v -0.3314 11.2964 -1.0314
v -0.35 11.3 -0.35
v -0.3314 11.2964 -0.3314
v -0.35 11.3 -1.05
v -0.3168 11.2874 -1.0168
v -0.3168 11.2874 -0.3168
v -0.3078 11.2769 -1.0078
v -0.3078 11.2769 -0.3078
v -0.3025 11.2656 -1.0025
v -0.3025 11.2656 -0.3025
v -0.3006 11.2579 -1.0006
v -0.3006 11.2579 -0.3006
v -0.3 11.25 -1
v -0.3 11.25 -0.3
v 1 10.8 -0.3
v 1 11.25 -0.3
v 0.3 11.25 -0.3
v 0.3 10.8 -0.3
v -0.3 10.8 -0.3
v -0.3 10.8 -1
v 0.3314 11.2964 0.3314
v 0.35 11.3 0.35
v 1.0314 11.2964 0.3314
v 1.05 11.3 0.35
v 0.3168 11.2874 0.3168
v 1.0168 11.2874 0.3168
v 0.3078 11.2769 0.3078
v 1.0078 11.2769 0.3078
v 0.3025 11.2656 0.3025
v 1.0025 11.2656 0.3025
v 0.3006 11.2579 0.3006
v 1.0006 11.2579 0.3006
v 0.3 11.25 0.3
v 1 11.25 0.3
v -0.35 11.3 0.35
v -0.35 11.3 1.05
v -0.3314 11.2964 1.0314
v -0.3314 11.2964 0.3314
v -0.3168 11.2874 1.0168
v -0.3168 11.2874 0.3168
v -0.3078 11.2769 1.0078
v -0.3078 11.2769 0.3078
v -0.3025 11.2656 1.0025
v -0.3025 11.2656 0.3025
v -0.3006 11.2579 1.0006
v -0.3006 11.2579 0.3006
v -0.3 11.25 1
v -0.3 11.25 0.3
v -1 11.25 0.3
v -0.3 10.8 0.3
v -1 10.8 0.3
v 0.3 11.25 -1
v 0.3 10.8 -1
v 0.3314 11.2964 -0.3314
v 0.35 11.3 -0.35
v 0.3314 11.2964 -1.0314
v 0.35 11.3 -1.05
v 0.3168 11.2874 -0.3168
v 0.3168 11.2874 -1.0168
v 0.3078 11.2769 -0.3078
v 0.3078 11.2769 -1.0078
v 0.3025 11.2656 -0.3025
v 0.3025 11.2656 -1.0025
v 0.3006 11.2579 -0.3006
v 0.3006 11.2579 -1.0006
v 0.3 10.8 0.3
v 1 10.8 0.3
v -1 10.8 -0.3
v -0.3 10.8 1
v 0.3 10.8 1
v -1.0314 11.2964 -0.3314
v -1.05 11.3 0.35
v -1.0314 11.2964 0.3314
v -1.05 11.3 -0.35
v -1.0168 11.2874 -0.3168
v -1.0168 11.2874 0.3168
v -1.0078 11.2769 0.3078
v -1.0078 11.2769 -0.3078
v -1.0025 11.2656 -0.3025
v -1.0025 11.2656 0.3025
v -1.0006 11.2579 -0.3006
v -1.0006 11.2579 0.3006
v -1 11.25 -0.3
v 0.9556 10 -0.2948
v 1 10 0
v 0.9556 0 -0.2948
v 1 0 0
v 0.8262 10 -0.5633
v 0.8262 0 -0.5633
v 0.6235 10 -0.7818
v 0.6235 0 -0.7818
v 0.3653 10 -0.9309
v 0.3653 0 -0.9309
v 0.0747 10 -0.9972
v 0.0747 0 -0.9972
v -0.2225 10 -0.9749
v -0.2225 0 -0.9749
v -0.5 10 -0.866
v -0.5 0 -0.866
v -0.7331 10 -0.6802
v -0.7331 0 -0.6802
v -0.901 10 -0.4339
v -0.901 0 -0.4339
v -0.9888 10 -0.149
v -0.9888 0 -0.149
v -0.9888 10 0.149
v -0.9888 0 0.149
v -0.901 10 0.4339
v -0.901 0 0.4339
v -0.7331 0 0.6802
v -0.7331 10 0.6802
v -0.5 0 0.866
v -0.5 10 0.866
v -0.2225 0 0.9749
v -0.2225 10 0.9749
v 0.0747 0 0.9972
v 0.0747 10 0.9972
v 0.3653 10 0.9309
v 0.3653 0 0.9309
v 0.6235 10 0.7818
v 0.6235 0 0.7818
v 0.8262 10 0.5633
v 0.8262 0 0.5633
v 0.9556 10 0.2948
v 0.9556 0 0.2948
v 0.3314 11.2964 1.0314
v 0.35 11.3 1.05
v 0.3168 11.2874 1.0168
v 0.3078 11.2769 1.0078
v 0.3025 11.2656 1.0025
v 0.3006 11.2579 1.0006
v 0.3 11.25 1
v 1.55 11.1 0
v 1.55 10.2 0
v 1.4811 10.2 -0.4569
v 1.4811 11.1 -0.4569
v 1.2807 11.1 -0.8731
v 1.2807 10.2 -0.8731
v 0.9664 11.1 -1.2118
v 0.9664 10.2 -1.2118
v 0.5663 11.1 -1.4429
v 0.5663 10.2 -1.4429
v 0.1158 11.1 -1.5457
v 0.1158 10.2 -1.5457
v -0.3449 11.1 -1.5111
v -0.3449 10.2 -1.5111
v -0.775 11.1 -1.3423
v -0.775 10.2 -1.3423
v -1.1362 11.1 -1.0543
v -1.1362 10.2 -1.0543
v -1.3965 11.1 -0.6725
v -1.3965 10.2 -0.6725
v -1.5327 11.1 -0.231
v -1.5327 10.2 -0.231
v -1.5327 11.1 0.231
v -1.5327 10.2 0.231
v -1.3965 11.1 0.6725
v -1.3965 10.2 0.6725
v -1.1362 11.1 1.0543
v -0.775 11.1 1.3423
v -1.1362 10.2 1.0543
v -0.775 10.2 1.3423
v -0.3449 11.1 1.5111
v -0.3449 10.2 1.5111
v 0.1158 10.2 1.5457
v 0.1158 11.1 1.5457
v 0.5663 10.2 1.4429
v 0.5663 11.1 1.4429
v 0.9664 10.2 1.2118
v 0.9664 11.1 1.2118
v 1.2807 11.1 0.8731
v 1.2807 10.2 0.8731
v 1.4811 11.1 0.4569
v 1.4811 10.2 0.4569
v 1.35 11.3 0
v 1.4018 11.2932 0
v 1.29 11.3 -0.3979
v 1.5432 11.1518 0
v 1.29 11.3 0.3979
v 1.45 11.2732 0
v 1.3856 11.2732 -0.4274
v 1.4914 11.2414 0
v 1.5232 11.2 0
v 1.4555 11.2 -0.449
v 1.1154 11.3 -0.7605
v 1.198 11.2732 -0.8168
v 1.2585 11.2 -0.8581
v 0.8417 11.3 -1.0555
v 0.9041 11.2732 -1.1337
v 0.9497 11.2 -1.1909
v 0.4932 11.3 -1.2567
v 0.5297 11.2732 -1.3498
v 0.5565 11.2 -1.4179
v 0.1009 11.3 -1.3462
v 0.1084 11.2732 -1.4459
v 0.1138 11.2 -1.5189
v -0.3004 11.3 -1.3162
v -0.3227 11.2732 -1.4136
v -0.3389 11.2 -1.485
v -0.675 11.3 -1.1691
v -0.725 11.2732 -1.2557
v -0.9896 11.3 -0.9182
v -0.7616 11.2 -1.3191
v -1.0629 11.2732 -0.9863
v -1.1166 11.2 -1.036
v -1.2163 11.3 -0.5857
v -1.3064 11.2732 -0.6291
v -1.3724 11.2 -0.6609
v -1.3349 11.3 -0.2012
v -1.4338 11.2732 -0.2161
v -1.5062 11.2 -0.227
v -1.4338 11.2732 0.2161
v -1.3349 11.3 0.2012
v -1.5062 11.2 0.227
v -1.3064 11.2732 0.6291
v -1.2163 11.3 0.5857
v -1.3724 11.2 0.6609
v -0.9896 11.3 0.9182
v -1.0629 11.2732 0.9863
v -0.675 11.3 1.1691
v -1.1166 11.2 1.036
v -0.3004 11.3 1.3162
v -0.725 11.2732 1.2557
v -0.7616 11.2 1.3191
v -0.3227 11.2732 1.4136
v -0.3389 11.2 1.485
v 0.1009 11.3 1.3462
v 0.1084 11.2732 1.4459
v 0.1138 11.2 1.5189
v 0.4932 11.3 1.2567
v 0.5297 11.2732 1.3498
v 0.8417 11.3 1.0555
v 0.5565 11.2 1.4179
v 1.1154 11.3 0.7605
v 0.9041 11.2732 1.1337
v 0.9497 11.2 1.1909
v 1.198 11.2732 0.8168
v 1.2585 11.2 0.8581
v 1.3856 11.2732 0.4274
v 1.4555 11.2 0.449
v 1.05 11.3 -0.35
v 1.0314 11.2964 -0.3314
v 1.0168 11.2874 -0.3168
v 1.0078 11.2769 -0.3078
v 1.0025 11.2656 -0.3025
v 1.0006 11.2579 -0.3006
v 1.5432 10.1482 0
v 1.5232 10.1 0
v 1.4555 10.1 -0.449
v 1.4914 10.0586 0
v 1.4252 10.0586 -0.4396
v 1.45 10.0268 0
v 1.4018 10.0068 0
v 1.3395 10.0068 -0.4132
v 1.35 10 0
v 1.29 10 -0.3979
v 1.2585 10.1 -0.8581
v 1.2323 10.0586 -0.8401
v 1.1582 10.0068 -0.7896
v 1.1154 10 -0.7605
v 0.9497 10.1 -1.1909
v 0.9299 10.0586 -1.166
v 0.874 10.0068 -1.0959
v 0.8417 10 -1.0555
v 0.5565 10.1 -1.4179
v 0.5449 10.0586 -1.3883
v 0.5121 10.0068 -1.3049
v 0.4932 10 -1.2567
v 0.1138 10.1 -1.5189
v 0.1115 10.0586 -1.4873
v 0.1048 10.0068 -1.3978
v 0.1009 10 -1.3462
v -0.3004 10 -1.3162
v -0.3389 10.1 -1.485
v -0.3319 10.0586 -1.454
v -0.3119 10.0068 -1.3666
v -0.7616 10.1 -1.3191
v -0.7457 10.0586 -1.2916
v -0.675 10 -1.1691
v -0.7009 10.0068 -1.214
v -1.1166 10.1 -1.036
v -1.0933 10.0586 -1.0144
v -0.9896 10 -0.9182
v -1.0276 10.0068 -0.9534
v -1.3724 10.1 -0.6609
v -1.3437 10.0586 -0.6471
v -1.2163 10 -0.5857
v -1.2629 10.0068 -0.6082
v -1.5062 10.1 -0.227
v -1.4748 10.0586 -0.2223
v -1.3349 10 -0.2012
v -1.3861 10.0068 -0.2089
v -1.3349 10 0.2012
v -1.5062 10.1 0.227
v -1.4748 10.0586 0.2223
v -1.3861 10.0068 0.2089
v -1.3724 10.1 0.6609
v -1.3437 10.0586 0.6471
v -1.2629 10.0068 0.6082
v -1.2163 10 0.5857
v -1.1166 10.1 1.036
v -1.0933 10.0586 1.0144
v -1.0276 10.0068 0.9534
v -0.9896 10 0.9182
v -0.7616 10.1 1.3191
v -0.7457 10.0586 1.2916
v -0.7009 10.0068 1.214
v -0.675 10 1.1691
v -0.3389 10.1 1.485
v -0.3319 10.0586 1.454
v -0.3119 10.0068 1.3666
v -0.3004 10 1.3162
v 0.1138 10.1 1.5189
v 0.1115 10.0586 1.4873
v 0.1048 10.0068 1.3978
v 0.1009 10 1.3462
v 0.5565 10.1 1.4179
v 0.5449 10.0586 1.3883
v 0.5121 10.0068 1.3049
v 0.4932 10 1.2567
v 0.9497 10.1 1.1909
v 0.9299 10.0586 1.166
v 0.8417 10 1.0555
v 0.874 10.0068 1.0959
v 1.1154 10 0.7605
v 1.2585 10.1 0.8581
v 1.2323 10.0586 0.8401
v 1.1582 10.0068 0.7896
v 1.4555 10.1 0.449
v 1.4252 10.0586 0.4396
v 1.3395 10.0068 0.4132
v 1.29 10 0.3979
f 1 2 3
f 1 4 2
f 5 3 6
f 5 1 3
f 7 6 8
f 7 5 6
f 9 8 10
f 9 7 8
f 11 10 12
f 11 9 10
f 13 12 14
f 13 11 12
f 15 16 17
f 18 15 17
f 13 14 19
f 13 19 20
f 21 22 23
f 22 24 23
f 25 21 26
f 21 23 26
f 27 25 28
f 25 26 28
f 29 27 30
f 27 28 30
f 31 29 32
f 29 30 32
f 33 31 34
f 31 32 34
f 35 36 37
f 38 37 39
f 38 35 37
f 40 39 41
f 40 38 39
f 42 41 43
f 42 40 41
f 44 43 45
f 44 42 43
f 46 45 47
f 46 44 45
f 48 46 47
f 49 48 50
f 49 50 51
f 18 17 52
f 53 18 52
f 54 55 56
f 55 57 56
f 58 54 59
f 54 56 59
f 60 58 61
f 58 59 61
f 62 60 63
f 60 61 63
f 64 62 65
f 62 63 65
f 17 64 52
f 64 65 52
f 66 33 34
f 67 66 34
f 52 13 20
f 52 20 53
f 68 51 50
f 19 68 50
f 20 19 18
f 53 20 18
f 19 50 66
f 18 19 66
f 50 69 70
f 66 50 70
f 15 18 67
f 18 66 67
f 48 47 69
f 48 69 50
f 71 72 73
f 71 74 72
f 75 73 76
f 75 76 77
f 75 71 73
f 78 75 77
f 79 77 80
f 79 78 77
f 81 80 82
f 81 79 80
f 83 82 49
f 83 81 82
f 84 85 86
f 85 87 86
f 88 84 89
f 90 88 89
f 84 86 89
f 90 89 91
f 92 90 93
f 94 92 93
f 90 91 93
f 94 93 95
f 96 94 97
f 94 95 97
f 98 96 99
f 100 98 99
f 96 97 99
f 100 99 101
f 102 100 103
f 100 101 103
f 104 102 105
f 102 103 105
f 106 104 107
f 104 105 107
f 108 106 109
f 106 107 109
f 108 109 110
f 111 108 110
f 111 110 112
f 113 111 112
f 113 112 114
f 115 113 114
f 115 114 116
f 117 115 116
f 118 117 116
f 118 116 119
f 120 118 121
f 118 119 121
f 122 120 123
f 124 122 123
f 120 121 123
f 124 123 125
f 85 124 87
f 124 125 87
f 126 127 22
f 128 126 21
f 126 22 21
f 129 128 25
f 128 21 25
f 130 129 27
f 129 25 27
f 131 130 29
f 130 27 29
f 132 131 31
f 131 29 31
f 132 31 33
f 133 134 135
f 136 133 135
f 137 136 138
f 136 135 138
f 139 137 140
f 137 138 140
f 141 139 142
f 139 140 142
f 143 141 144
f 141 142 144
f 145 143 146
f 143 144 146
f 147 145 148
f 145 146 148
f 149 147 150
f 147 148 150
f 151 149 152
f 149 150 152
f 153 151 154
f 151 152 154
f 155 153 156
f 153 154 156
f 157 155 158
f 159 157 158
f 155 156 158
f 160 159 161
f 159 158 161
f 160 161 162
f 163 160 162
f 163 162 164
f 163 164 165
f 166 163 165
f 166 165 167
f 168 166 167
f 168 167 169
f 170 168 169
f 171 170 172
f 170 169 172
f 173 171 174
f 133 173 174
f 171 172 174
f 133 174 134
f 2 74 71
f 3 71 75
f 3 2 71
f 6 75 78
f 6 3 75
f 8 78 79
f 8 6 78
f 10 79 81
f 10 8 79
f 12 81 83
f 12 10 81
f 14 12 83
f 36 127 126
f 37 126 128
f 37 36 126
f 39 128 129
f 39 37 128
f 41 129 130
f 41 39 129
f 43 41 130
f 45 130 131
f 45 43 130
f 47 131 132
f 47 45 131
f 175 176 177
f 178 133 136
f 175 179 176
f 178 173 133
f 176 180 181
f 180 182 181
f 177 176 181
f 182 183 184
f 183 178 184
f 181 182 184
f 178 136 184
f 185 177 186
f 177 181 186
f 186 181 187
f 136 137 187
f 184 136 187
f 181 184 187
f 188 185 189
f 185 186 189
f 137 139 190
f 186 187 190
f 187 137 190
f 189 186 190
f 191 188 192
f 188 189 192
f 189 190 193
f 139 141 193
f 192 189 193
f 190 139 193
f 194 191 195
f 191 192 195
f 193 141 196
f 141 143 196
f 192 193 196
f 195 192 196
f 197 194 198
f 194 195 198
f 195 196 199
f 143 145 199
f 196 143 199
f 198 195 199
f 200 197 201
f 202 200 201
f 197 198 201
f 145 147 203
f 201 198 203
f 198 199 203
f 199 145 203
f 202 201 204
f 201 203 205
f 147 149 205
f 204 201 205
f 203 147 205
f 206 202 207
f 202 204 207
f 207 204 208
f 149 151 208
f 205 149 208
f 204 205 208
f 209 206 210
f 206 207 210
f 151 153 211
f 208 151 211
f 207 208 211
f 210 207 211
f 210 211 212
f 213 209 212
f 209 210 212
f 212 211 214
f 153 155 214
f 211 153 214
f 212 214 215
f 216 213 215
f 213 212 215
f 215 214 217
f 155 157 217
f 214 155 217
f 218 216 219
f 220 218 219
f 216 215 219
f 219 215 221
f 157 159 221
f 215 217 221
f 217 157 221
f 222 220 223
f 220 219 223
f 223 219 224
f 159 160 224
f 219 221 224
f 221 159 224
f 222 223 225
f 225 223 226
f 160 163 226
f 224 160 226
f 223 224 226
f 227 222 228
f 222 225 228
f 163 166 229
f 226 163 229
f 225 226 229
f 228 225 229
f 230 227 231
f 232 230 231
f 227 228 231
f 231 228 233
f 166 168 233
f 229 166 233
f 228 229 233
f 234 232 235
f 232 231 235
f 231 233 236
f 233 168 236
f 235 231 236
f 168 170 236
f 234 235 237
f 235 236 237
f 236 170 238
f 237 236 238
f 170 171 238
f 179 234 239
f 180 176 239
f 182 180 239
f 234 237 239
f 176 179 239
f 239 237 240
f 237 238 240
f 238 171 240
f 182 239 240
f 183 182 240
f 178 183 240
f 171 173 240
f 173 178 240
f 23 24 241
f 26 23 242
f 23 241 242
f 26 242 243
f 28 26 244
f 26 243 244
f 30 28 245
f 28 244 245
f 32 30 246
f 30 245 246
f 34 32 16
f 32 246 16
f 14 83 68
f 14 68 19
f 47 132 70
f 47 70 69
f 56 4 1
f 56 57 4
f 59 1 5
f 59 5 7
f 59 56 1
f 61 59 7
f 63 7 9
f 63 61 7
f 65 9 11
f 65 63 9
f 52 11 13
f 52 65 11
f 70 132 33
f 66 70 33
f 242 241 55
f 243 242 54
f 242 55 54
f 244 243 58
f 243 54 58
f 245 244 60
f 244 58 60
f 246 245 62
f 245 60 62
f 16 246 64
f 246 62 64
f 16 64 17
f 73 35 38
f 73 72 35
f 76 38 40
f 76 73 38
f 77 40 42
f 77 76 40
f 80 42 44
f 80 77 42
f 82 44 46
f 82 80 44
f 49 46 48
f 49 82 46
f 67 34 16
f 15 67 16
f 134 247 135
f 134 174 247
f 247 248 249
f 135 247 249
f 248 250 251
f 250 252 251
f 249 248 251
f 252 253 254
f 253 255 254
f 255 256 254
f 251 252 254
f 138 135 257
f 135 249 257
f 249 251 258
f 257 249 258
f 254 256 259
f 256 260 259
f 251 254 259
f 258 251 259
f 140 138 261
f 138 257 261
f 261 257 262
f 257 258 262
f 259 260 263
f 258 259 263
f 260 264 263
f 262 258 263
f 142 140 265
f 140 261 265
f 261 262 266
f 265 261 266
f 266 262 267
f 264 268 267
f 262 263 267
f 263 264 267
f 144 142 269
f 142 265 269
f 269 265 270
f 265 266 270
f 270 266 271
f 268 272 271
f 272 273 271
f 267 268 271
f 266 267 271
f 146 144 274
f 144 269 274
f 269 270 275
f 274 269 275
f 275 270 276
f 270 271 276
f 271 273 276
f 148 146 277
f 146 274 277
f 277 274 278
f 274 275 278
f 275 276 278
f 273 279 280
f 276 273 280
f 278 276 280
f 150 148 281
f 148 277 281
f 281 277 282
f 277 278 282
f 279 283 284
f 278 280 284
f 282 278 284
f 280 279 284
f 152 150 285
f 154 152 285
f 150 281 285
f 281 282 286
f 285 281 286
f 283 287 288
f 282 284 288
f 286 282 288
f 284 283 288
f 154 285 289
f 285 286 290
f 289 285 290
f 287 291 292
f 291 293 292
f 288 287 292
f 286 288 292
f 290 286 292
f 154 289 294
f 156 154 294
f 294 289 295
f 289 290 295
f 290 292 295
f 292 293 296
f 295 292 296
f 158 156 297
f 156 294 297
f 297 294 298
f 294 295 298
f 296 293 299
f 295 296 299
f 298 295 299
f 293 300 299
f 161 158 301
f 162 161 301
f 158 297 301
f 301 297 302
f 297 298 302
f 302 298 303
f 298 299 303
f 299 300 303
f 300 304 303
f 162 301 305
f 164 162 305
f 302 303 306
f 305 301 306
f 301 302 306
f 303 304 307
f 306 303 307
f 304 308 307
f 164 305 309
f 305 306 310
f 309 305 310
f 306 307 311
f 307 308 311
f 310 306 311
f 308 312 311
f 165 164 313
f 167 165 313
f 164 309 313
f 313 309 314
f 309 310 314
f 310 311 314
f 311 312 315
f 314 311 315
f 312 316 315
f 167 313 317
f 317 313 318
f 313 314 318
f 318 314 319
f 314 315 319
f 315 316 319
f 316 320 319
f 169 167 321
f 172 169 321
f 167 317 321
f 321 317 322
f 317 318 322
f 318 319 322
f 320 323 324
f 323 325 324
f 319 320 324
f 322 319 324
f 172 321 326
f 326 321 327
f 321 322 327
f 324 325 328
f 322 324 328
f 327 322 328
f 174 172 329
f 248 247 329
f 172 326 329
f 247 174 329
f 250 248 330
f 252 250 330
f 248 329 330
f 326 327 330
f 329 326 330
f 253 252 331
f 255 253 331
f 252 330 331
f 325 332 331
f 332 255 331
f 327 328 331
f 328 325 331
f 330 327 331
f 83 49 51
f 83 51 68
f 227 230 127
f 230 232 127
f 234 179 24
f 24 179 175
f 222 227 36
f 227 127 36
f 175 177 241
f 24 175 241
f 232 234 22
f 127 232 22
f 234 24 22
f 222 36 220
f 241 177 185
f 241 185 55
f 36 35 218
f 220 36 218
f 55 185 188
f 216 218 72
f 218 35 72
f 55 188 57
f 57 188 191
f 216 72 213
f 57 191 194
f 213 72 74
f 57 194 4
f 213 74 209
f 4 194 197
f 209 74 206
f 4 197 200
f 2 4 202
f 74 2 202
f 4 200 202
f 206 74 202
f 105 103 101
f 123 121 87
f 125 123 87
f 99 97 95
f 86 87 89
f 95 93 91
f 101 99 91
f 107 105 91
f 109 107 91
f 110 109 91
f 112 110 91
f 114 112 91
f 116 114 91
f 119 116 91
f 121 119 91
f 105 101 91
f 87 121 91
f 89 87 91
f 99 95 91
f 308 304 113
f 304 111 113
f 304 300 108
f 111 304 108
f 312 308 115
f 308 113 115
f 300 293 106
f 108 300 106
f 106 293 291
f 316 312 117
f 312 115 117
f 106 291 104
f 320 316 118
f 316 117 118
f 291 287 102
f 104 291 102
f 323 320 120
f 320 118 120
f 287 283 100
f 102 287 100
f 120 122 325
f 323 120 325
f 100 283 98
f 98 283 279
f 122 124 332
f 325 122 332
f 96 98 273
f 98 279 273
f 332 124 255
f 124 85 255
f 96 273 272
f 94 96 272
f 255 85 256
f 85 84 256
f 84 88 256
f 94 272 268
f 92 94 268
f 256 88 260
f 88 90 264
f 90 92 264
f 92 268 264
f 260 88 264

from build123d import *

# Parameters (mm, degrees)
FILLET_R     = 0.2
POCKET_DEPTH = 0.5
FILLET001_R  = 0.05


with BuildPart() as part:
    # Sketch → Revolution (revolve)
    with BuildSketch(Plane.XY):
        Polygon((0, 0), (0, 11.3), (1.55, 11.3), (1.55, 10), (1, 10), (1, 0), align=None)
    revolve(axis=Axis((0, 0, 0), (0, 1, 0)))

    # Fillet
    fillet_edges = [part.edges().sort_by_distance(p)[0] for p in [
        (-1.55, 11.3, 0),
        (-1.55, 10, 0),
    ]]
    fillet(fillet_edges, radius=FILLET_R)

    # Sketch001 (on Face1 of Fillet) → Pocket (cut)
    with BuildSketch(Plane(origin=(0, 11.3, 0), x_dir=(-1, 0, 0), z_dir=(0, 1, 0))):
        Polygon((0, 1), (0.3, 1), (0.3, 0.3), (1, 0.3), (1, -0.3), (0.3, -0.3), (0.3, -1), (0, -1), align=None)
    pocket = extrude(amount=-POCKET_DEPTH, mode=Mode.SUBTRACT)

    # Mirrored: Pocket across Sketch001 V_Axis
    add(pocket.mirror(Plane(origin=(0, 11.3, 0), x_dir=(0, 1, 0), z_dir=(-1, 0, 0))), mode=Mode.SUBTRACT)

    # Fillet001
    fillet001_edges = [part.edges().sort_by_distance(p)[0] for p in [
        (-0.65, 11.3, 0.3),
        (-1, 11.3, 0),
        (-0.65, 11.3, -0.3),
        (-0.3, 11.3, -0.65),
        (-0.15, 11.3, -1),
        (0.15, 11.3, -1),
        (0.3, 11.3, -0.65),
        (0.65, 11.3, -0.3),
        (0.65, 11.3, 0.3),
        (1, 11.3, 0),
        (0.3, 11.3, 0.65),
        (-0.3, 11.3, 0.65),
        (-0.15, 11.3, 1),
        (0.15, 11.3, 1),
    ]]
    fillet(fillet001_edges, radius=FILLET001_R)


solid = part.part
